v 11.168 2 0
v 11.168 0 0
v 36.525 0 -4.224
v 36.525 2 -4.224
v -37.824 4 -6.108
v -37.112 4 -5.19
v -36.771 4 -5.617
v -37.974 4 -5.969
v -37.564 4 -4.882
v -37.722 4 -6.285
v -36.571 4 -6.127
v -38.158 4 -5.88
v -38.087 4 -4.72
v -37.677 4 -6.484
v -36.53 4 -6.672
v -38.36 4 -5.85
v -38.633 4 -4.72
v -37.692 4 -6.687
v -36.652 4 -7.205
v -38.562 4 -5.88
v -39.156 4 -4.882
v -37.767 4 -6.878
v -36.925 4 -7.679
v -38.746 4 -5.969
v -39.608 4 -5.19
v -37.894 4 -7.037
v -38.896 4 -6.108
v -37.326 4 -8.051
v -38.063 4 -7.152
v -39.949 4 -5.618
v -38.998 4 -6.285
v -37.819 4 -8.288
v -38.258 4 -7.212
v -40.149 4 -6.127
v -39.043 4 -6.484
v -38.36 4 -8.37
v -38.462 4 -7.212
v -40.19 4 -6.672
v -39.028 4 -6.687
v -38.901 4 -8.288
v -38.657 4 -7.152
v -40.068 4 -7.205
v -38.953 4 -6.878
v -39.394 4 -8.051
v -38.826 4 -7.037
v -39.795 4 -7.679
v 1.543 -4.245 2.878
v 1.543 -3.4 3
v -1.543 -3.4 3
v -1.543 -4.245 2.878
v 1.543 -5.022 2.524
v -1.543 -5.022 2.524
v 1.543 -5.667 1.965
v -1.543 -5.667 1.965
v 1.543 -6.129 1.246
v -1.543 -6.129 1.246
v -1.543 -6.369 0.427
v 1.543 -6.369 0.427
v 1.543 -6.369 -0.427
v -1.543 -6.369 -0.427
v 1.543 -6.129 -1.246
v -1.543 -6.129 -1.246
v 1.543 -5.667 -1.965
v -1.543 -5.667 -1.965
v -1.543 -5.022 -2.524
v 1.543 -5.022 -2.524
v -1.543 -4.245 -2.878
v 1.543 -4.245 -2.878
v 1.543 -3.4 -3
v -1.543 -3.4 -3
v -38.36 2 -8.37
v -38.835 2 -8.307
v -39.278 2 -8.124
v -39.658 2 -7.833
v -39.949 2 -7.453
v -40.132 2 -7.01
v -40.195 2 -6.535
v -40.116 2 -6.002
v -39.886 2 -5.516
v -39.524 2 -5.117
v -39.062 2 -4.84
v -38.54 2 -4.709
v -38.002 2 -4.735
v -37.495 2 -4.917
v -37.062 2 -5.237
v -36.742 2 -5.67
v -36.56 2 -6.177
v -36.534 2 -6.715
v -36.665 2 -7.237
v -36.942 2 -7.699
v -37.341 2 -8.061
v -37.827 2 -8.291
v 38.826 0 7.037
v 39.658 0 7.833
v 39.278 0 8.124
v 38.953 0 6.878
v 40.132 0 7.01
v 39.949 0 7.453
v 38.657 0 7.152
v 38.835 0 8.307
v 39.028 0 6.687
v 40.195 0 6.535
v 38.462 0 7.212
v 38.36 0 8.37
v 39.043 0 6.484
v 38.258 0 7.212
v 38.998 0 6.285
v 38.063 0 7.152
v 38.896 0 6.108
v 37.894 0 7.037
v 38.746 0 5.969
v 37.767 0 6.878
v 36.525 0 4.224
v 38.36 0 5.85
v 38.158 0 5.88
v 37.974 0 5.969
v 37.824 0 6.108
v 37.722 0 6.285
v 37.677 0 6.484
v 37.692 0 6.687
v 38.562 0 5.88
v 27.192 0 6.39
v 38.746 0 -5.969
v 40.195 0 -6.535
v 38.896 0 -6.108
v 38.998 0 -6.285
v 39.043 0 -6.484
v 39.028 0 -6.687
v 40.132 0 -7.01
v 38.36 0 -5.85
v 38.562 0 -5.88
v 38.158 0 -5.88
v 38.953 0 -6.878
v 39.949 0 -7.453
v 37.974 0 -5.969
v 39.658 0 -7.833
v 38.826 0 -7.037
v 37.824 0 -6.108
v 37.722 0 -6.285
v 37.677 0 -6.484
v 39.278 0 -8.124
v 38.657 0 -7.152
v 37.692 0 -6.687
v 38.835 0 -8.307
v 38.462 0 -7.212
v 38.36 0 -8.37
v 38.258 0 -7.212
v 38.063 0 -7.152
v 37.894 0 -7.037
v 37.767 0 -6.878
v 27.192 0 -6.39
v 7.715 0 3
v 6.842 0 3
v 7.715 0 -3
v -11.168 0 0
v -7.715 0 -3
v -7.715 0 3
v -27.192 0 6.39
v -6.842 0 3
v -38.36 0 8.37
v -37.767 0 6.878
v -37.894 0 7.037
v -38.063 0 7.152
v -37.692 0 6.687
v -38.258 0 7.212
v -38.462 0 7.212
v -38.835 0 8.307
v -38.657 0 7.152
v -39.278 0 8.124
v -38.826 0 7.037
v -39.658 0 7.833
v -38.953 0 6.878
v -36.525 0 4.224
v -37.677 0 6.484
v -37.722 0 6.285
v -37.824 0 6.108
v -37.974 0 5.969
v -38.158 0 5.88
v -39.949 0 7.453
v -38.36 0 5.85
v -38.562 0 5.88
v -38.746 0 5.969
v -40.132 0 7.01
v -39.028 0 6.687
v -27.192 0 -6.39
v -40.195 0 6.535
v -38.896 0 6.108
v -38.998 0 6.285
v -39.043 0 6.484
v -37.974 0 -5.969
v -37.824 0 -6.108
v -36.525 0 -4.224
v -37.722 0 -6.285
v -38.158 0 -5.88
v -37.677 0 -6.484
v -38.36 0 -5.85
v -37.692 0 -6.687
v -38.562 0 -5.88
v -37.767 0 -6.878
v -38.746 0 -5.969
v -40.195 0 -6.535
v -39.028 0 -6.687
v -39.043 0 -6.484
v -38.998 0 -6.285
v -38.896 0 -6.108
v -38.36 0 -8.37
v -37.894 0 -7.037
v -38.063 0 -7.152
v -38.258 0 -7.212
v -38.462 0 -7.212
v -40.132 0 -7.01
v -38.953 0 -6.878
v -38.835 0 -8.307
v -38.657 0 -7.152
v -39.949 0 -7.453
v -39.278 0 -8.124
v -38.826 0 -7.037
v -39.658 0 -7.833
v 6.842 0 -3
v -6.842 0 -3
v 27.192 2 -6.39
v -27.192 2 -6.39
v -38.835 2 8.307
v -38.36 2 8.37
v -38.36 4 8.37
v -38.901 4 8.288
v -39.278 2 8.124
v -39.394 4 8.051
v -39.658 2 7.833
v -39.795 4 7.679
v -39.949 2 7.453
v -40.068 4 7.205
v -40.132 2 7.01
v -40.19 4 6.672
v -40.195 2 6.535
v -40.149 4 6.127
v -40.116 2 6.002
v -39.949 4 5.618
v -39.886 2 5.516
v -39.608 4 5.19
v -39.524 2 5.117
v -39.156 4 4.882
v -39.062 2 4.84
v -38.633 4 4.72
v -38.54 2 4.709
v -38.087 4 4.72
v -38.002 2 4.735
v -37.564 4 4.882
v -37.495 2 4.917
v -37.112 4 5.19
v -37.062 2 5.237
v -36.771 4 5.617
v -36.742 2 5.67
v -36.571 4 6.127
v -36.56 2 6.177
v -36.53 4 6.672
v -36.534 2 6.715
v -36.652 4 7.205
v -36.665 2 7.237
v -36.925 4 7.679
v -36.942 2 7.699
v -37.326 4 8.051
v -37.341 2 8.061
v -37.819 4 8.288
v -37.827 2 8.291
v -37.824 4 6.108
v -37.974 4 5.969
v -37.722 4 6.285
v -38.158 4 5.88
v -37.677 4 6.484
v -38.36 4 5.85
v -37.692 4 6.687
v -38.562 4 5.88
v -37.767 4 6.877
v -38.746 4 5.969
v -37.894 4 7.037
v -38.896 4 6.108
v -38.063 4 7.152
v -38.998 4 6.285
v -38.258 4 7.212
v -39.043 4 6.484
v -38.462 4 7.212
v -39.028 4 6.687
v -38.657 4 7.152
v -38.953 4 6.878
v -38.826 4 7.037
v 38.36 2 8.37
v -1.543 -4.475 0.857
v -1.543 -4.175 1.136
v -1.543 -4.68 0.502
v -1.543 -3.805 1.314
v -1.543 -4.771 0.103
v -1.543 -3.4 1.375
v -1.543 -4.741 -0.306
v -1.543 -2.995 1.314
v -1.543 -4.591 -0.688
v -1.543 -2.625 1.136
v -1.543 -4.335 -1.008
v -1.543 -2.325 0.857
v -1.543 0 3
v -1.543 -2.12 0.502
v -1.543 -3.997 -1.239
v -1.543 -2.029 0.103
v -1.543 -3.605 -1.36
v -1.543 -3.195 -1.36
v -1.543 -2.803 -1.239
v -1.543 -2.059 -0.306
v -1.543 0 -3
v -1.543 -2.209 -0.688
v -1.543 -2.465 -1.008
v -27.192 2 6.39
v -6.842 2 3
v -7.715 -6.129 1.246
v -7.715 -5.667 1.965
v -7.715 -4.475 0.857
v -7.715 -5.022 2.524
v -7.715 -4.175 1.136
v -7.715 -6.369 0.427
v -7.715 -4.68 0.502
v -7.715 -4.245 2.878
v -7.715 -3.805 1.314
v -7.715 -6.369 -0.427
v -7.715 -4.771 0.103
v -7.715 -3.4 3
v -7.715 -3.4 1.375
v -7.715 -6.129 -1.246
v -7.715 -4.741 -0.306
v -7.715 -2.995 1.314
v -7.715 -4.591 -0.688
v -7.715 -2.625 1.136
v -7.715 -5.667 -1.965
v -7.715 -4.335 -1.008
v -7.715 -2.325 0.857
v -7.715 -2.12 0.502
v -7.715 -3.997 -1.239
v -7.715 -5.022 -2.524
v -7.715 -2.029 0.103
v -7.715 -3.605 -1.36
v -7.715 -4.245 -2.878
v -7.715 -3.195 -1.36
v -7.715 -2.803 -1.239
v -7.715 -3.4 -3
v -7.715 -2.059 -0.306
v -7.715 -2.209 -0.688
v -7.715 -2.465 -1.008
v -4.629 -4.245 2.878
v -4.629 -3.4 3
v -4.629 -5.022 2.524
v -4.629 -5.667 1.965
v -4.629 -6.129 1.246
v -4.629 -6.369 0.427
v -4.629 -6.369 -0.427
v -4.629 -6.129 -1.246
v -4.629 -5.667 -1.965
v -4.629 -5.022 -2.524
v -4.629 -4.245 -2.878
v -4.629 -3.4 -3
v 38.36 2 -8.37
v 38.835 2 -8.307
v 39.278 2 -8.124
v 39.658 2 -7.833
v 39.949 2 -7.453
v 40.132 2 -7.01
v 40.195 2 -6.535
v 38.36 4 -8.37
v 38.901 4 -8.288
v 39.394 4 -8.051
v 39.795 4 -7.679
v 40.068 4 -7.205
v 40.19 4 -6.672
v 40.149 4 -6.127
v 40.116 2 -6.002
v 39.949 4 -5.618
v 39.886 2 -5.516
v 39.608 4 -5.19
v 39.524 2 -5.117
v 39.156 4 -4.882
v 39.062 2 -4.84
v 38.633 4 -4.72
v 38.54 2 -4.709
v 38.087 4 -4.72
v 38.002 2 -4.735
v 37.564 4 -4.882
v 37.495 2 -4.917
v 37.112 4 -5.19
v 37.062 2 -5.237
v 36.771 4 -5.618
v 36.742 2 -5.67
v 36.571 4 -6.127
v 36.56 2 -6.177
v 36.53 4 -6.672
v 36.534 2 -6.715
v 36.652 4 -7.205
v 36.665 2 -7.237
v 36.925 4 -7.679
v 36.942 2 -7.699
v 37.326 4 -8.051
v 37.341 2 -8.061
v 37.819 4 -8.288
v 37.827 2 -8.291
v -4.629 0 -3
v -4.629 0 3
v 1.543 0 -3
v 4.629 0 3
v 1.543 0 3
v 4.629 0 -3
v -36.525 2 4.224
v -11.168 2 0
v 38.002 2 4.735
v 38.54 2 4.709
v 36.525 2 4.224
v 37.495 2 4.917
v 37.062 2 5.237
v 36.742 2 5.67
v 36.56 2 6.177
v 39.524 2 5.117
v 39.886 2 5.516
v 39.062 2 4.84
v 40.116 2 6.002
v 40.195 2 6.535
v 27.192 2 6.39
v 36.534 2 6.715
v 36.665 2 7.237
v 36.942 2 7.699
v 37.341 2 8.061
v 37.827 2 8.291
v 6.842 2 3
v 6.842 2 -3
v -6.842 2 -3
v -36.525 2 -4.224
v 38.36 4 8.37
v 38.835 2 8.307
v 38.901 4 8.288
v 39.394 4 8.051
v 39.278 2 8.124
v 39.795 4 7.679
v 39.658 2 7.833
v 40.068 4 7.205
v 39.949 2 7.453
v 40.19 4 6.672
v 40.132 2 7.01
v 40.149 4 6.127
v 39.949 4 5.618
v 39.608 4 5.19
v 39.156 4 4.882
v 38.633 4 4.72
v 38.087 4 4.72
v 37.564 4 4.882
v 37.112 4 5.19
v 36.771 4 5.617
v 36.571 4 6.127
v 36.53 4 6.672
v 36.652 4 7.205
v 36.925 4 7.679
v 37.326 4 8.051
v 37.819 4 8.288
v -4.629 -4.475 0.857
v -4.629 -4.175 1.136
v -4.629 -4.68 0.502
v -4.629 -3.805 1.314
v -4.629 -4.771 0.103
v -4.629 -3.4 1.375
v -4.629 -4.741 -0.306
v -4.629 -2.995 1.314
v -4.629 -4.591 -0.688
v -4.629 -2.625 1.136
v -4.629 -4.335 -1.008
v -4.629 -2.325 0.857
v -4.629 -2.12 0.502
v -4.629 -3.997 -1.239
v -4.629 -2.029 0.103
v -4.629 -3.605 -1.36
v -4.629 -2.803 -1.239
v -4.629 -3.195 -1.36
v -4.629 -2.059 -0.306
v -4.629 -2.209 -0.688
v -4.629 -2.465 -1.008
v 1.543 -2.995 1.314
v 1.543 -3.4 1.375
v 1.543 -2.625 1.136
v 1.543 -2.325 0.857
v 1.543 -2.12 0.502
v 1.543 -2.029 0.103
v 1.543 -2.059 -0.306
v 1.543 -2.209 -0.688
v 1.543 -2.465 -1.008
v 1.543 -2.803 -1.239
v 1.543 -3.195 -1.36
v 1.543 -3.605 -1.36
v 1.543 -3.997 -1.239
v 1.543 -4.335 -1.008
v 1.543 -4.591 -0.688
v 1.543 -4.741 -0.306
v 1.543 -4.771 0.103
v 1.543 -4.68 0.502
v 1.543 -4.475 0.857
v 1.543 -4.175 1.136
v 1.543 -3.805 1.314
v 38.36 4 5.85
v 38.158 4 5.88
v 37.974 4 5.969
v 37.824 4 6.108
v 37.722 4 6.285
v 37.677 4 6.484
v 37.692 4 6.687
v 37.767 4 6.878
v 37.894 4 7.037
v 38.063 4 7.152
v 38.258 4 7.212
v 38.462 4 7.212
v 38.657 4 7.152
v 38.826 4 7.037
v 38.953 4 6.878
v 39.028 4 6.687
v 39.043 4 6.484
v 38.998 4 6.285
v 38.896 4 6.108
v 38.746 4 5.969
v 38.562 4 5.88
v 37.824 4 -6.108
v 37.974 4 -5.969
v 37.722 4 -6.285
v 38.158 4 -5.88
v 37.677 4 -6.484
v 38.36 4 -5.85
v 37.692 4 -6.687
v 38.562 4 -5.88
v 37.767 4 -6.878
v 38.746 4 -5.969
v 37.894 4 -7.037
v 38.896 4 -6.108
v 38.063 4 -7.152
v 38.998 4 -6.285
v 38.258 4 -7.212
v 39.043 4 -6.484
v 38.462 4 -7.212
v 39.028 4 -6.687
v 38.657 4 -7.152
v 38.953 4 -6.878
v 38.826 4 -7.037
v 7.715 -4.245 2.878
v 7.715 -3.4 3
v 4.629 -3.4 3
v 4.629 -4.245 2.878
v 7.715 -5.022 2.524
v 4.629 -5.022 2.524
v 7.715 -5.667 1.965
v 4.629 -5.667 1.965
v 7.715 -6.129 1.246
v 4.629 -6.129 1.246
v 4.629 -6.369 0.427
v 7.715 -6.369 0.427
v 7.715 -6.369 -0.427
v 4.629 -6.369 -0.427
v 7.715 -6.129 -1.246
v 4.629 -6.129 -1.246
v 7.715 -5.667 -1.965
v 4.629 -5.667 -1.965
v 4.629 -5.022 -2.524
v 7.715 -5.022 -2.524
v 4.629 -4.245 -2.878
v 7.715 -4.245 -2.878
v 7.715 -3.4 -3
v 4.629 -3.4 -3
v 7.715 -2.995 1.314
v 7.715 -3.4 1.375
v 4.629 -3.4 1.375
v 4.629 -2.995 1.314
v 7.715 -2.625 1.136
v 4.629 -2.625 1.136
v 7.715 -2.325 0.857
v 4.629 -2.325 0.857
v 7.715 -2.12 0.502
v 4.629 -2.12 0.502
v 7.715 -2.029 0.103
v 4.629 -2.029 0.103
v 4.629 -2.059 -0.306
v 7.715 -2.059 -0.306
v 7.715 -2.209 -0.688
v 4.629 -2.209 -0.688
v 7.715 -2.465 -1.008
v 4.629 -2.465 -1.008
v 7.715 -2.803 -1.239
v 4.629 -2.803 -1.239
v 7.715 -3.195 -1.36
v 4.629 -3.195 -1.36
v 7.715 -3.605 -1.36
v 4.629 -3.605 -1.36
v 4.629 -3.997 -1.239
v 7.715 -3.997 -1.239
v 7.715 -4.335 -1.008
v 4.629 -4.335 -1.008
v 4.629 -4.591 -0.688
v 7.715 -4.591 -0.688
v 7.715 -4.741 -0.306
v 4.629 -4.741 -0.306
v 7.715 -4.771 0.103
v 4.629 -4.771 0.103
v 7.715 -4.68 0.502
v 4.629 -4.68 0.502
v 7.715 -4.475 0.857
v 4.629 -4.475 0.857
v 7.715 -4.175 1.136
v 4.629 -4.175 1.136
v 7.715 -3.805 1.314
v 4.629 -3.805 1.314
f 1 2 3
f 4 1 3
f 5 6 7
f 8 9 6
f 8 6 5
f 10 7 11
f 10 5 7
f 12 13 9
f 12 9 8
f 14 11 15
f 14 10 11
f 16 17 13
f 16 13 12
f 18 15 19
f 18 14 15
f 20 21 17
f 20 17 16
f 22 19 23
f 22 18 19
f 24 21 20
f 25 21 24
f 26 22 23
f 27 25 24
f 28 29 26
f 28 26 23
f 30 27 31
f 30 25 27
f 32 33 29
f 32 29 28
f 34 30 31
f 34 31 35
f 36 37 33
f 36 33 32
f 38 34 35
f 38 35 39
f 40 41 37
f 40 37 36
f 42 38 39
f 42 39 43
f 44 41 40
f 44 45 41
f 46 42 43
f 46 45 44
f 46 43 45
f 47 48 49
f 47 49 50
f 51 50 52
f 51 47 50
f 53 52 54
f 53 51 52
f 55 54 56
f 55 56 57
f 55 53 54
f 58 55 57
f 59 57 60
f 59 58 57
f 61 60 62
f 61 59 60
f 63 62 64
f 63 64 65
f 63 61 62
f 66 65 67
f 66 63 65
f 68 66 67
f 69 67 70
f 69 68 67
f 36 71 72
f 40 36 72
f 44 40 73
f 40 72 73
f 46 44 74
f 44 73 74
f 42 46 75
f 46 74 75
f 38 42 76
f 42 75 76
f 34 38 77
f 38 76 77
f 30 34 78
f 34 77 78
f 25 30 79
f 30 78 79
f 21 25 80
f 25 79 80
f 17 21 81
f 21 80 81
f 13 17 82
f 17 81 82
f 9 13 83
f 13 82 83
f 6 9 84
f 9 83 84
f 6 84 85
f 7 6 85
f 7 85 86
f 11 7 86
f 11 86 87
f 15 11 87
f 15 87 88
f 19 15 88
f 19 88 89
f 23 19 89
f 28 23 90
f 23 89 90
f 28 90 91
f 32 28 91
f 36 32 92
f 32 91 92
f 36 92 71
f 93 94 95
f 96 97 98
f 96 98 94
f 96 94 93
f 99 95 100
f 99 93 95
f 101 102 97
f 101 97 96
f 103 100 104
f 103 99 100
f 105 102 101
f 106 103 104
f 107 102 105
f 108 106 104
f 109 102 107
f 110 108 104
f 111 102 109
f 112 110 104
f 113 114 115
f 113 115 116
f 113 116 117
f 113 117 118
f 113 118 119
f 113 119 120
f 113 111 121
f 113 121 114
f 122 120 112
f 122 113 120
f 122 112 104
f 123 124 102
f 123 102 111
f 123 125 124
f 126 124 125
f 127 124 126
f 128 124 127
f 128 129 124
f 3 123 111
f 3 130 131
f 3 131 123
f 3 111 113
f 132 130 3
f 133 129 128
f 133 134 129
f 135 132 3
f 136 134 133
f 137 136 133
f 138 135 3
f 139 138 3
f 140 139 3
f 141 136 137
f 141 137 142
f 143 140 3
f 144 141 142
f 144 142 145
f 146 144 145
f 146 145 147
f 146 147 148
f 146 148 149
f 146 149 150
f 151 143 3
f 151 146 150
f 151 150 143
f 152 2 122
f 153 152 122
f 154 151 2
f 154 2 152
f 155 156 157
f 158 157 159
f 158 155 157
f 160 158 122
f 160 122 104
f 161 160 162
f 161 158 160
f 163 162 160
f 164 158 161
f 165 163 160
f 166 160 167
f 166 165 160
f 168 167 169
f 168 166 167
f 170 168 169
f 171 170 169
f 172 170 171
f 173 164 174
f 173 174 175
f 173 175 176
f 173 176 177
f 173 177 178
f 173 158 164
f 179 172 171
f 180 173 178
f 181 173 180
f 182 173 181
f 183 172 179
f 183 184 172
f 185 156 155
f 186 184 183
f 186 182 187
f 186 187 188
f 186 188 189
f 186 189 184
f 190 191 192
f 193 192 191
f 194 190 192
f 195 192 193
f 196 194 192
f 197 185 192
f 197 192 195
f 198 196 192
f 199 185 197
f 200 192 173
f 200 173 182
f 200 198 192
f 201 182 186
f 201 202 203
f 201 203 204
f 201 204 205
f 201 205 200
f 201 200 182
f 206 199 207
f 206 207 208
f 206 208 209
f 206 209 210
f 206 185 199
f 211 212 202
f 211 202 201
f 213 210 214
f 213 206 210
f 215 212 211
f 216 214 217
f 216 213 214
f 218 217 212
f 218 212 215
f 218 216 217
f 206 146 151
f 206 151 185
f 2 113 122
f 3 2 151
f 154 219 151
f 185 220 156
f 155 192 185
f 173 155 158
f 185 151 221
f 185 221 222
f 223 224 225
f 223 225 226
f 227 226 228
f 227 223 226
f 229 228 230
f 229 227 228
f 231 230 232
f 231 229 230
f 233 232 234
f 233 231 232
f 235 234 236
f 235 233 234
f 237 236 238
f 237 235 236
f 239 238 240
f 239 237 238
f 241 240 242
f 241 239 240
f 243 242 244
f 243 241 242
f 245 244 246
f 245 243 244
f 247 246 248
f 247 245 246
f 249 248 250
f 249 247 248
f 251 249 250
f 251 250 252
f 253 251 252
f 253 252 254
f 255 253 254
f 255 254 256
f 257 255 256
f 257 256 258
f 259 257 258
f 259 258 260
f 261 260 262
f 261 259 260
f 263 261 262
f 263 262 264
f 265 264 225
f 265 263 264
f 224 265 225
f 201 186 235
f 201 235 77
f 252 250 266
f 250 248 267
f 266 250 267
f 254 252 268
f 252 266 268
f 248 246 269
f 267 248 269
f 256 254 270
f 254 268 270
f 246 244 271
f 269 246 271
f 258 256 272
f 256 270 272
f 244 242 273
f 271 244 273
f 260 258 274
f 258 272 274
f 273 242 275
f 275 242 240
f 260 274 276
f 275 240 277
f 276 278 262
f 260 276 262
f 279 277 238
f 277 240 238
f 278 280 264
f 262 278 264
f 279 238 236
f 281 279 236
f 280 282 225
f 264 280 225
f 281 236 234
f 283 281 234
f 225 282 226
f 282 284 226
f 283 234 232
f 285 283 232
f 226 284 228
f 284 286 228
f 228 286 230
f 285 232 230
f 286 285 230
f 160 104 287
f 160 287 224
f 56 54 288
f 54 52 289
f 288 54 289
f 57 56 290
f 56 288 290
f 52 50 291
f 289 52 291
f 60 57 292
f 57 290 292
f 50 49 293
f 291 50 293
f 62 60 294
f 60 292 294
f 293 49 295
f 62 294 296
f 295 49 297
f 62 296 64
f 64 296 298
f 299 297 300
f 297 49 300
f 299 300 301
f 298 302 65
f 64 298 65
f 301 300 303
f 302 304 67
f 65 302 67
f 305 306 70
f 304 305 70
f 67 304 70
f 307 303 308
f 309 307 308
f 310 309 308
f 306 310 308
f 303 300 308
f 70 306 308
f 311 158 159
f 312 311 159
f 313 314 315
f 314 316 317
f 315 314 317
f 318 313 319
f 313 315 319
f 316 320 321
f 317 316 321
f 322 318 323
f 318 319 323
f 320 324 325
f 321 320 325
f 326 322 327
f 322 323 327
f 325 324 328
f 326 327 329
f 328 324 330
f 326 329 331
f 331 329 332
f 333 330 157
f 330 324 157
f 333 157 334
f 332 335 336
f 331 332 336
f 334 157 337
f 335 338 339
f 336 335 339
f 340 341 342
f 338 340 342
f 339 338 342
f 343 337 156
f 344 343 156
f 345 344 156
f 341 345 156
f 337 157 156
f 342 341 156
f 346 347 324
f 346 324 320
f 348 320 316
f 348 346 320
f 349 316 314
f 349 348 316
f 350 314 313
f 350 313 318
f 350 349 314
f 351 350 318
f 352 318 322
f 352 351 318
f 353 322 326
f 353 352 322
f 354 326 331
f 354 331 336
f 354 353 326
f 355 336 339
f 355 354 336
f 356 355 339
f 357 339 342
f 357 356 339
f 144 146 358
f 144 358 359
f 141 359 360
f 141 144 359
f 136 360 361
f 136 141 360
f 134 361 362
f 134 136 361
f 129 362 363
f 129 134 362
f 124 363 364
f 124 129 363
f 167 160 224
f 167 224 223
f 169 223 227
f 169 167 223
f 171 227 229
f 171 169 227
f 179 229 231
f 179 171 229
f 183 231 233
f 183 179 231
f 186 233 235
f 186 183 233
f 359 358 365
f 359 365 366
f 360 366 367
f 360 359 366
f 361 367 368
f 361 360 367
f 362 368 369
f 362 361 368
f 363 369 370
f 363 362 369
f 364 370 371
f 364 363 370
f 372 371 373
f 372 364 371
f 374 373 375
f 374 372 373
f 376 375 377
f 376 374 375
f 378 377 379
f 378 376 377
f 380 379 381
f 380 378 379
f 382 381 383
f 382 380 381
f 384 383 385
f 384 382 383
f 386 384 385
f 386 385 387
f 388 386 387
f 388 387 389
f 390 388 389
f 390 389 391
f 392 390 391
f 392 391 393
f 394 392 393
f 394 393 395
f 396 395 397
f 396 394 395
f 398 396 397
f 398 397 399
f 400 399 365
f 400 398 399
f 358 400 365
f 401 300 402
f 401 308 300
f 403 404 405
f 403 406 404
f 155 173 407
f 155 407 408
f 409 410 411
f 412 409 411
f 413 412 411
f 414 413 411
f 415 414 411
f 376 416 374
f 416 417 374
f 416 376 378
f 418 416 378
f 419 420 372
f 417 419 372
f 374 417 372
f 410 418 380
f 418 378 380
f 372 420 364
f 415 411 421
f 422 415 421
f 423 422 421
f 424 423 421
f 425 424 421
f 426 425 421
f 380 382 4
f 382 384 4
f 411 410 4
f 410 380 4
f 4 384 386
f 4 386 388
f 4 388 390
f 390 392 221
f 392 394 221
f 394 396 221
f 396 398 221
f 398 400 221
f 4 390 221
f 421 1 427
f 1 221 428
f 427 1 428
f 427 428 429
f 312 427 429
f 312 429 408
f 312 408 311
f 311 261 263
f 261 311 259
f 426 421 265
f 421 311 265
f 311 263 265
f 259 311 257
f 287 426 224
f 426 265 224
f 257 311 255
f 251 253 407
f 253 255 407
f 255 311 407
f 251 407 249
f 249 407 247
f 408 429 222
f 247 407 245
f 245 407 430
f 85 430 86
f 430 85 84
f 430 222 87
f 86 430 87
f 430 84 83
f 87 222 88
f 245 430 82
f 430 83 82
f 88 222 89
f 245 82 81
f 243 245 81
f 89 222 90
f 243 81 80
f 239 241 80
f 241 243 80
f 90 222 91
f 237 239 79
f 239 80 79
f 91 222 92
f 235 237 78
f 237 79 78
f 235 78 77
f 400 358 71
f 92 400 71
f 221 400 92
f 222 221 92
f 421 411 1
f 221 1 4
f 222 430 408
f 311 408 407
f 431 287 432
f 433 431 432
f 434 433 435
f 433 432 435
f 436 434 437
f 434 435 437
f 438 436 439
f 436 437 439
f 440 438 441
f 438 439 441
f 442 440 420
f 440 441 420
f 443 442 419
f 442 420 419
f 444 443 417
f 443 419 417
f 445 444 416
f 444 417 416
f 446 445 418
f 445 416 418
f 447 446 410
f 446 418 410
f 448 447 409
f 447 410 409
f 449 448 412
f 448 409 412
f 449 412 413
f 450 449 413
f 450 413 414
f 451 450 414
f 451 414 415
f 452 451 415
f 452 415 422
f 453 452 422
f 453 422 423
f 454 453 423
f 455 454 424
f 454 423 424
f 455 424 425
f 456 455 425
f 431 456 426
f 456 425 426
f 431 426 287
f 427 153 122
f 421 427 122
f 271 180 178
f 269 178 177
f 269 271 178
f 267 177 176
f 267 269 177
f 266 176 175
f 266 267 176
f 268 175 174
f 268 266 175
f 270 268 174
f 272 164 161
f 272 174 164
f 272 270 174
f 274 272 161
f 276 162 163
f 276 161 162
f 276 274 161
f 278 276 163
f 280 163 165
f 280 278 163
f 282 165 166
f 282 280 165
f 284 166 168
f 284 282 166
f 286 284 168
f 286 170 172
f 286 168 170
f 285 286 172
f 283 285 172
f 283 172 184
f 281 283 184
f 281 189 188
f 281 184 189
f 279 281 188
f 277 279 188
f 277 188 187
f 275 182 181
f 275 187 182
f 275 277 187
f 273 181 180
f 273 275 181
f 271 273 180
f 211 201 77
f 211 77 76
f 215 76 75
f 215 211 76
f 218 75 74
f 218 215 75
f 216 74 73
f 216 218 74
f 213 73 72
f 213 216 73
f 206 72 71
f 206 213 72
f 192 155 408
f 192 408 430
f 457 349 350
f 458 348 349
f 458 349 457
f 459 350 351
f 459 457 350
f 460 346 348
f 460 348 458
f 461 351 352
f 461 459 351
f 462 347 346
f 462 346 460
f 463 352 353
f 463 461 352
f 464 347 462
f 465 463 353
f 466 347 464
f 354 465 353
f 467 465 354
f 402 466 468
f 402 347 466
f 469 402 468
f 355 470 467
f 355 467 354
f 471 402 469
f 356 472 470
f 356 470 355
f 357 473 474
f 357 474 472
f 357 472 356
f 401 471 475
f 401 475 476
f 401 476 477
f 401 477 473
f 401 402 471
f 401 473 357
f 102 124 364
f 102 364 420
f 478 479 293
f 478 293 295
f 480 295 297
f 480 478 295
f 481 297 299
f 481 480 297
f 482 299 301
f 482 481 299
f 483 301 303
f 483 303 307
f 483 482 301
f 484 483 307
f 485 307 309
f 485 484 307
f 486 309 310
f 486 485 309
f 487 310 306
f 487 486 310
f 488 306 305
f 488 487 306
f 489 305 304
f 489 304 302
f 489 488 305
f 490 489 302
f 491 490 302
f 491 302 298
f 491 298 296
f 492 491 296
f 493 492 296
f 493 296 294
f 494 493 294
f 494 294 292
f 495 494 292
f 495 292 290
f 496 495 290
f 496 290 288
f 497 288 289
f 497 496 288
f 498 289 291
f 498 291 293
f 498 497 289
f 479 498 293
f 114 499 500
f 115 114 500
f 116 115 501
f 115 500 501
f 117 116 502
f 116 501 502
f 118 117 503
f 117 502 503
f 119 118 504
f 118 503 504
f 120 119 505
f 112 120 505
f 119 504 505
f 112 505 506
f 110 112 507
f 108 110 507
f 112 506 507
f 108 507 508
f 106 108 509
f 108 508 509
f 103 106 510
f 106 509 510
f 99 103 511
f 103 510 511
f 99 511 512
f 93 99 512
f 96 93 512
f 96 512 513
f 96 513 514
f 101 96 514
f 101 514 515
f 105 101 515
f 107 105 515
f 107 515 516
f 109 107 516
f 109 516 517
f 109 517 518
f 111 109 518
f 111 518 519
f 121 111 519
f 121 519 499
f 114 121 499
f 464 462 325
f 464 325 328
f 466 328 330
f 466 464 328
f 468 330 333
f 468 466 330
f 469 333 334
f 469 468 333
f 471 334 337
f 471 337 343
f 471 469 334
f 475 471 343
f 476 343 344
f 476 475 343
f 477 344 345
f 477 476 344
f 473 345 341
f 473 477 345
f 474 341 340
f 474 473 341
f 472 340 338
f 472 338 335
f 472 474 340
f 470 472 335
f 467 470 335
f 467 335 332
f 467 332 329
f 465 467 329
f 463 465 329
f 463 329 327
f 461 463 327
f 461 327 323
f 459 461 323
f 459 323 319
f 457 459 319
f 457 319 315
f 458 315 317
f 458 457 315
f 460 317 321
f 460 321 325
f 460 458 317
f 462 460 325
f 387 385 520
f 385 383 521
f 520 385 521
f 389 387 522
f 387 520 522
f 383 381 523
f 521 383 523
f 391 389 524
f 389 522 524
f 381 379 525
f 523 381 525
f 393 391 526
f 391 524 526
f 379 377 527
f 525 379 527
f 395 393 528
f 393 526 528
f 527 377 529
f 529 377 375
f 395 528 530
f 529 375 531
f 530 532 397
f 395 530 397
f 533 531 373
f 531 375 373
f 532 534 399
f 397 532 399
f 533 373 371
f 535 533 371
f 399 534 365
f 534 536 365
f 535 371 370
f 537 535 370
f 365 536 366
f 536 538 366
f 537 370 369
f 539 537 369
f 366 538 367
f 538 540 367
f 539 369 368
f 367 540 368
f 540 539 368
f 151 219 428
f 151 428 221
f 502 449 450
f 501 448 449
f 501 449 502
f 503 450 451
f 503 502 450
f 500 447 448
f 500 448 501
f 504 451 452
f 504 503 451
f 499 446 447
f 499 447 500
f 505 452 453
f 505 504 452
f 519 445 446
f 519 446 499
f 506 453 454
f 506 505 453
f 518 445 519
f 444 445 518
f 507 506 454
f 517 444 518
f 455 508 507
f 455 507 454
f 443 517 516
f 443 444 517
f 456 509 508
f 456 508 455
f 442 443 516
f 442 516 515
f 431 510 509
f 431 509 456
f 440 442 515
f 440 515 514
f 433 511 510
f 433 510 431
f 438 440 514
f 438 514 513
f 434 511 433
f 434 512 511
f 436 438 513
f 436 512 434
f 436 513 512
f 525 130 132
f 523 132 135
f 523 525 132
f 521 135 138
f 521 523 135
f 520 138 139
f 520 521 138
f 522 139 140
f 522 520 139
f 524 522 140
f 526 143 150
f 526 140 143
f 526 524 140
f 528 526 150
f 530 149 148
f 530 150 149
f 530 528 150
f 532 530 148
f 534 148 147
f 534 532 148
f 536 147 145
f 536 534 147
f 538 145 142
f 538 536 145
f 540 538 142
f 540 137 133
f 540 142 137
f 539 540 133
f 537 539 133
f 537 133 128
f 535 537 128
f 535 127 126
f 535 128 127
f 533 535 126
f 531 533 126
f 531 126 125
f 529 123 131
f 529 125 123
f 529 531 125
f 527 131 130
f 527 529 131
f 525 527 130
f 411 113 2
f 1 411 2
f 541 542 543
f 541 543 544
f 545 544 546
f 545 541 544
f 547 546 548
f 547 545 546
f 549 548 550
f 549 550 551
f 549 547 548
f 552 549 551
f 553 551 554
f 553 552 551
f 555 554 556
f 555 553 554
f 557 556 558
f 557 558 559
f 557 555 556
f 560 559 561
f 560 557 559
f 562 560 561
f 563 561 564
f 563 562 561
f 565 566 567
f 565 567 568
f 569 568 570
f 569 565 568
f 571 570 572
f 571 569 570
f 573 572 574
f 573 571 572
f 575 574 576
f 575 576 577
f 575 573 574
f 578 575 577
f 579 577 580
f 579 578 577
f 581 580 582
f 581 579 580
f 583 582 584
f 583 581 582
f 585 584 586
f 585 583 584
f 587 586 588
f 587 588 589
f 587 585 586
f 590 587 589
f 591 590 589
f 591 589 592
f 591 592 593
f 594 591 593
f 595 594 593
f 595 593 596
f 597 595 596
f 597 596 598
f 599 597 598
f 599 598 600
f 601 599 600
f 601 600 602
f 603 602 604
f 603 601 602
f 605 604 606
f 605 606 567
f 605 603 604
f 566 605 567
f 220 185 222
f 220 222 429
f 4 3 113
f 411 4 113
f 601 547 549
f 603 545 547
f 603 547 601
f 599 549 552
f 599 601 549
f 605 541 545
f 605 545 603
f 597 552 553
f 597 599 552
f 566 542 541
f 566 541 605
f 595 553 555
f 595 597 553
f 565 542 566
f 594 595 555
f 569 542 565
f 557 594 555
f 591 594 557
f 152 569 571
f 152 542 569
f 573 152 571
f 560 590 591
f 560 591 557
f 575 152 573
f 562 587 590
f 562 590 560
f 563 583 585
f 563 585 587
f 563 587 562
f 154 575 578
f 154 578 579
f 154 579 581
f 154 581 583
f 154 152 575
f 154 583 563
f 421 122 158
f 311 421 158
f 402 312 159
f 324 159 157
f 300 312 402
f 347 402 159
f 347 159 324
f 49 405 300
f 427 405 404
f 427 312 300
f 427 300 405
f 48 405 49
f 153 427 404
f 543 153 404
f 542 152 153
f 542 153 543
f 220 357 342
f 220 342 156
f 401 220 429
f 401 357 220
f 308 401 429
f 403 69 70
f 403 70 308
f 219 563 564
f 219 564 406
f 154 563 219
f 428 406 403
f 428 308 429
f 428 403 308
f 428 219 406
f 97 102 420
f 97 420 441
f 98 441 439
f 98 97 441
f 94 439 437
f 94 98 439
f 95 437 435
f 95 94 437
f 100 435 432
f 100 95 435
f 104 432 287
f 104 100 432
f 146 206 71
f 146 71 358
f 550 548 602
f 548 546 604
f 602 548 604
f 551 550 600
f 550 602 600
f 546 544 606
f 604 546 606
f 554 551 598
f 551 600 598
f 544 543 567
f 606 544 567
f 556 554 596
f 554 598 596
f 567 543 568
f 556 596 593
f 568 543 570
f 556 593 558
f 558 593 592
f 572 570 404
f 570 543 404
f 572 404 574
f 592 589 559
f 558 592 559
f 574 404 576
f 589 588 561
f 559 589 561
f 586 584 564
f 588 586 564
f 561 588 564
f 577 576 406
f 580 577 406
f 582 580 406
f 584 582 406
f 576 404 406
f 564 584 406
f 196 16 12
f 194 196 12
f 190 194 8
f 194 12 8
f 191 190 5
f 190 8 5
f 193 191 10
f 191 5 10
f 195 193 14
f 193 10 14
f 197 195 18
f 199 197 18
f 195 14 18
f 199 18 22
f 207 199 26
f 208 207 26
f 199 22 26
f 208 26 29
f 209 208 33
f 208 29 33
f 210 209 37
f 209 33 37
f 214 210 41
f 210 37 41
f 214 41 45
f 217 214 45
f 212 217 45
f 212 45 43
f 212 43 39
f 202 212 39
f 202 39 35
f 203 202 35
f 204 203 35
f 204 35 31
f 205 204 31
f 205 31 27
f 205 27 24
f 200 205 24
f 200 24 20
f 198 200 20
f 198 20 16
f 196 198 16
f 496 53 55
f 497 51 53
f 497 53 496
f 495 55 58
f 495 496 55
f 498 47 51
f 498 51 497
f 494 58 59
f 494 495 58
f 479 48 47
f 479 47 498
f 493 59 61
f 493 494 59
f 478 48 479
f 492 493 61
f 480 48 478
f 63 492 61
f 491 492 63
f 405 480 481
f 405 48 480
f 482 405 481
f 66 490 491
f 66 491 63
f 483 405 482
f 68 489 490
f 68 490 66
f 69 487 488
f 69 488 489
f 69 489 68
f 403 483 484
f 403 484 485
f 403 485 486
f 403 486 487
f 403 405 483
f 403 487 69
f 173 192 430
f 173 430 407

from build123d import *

# Parameters (mm, degrees)
BOSS_EXTRUDE2_DEPTH                        = 2
SKETCH7_R                                  = 1.375
BOSS_EXTRUDE4_DEPTH                        = 3.086
LPATTERN1_COUNT                            = 3
LPATTERN1_PITCH                            = 6.172
SKETCH8_R                                  = 1.835
BOSS_EXTRUDE5_DEPTH                        = 2
SKETCH9_R                                  = 0.685
CUT_EXTRUDE1_DEPTH                         = 43.353925
MIRROR1_AT_THE_SECOND_PLANE_COPY_1_SKETC_R = 1.835
MIRROR1_AT_THE_SECOND_PLANE_COPY_1_DEPTH   = 2
MIRROR1_AT_THE_SECOND_PLANE_COPY_2_SKETC_R = 0.685
MIRROR1_AT_THE_SECOND_PLANE_COPY_2_DEPTH   = 43.353925


with BuildPart() as part:
    # Sketch3 → Boss-Extrude2 (new body)
    with BuildSketch(Plane(origin=(0, 0, 0), x_dir=(1, 0, 0), z_dir=(0, 1, 0))):
        with BuildLine():
            Line((38.36, -8.37), (-38.36, -8.37))
            ThreePointArc((-38.36, -8.37), (-39.657541, -7.832541), (-40.195, -6.535))
            Line((-40.195, -6.535), (-40.195, 6.535))
            ThreePointArc((-40.195, 6.535), (-39.657541, 7.832541), (-38.36, 8.37))
            Line((-38.36, 8.37), (38.36, 8.37))
            ThreePointArc((38.36, 8.37), (39.657541, 7.832541), (40.195, 6.535))
            Line((40.195, 6.535), (40.195, -6.535))
            ThreePointArc((40.195, -6.535), (39.657541, -7.832541), (38.36, -8.37))
        make_face()
        Polygon((6.841855, -3), (27.192466, -6.39), (-27.192466, -6.39), (-6.841855, -3), align=None, mode=Mode.SUBTRACT)
        Polygon((-27.192466, 6.39), (-6.841855, 3), (6.841855, 3), (27.192466, 6.39), align=None, mode=Mode.SUBTRACT)
        Polygon((-36.525, 4.224041), (-36.525, -4.224041), (-11.167534, 0), align=None, mode=Mode.SUBTRACT)
        Polygon((36.525, -4.224041), (11.167534, 0), (36.525, 4.224041), align=None, mode=Mode.SUBTRACT)
    extrude(amount=BOSS_EXTRUDE2_DEPTH)

    # Sketch7 → Boss-Extrude4 (add)
    with BuildSketch(Plane.ZY.offset(-7.715)):
        with BuildLine():
            Line((-3, 0), (3, 0))
            Line((3, 0), (3, -3.4))
            ThreePointArc((3, -3.4), (0, -6.4), (-3, -3.4))
            Line((-3, -3.4), (-3, 0))
        make_face()
        with Locations((0, -3.4)):
            Circle(SKETCH7_R, mode=Mode.SUBTRACT)
    boss_extrude4 = extrude(amount=BOSS_EXTRUDE4_DEPTH)

    # LPattern1: Boss-Extrude4 ×3
    with Locations(*[(-i * LPATTERN1_PITCH, 0, 0) for i in range(1, LPATTERN1_COUNT)]):
        add(boss_extrude4)

    # Sketch8 → Boss-Extrude5 (add)
    with BuildSketch(Plane(origin=(0, 2, 0), x_dir=(1, 0, 0), z_dir=(0, 1, 0))):
        with Locations(Location((-38.36, 6.535, 0), (0, 0, 90))):
            Circle(SKETCH8_R)
    boss_extrude5 = extrude(amount=BOSS_EXTRUDE5_DEPTH)

    # Sketch9 → Cut-Extrude1 (cut, through all)
    with BuildSketch(Plane(origin=(0, 4, 0), x_dir=(1, 0, 0), z_dir=(0, 1, 0))):
        with Locations(Location((-38.36, 6.535, 0), (0, 0, 270))):
            Circle(SKETCH9_R)
    cut_extrude1 = extrude(amount=-CUT_EXTRUDE1_DEPTH, mode=Mode.SUBTRACT)

    # Mirror1: Boss-Extrude5, Cut-Extrude1 across plane
    add(boss_extrude5.mirror(Plane(origin=(0, 0, 0), x_dir=(0, 0, 1), z_dir=(1, 0, 0))))
    add(cut_extrude1.mirror(Plane(origin=(0, 0, 0), x_dir=(0, 0, 1), z_dir=(1, 0, 0))), mode=Mode.SUBTRACT)

    # Mirror1 at the second plane: Boss-Extrude5, Cut-Extrude1 across plane
    add(boss_extrude5.mirror(Plane.XY))
    add(cut_extrude1.mirror(Plane.XY), mode=Mode.SUBTRACT)

    # Mirror1 at the second plane copy 1 sketc → Mirror1 at the second plane copy 1 (add)
    with BuildSketch(Plane(origin=(0, 2, 0), x_dir=(-1, 0, 0), z_dir=(0, 1, 0))):
        with Locations(Location((-38.36, 6.535, 0), (0, 0, 90))):
            Circle(MIRROR1_AT_THE_SECOND_PLANE_COPY_1_SKETC_R)
    extrude(amount=MIRROR1_AT_THE_SECOND_PLANE_COPY_1_DEPTH)

    # Mirror1 at the second plane copy 2 sketc → Mirror1 at the second plane copy 2 (cut, through all)
    with BuildSketch(Plane(origin=(0, 4, 0), x_dir=(-1, 0, 0), z_dir=(0, 1, 0))):
        with Locations(Location((-38.36, 6.535, 0), (0, 0, 270))):
            Circle(MIRROR1_AT_THE_SECOND_PLANE_COPY_2_SKETC_R)
    extrude(amount=-MIRROR1_AT_THE_SECOND_PLANE_COPY_2_DEPTH, mode=Mode.SUBTRACT)


solid = part.part
